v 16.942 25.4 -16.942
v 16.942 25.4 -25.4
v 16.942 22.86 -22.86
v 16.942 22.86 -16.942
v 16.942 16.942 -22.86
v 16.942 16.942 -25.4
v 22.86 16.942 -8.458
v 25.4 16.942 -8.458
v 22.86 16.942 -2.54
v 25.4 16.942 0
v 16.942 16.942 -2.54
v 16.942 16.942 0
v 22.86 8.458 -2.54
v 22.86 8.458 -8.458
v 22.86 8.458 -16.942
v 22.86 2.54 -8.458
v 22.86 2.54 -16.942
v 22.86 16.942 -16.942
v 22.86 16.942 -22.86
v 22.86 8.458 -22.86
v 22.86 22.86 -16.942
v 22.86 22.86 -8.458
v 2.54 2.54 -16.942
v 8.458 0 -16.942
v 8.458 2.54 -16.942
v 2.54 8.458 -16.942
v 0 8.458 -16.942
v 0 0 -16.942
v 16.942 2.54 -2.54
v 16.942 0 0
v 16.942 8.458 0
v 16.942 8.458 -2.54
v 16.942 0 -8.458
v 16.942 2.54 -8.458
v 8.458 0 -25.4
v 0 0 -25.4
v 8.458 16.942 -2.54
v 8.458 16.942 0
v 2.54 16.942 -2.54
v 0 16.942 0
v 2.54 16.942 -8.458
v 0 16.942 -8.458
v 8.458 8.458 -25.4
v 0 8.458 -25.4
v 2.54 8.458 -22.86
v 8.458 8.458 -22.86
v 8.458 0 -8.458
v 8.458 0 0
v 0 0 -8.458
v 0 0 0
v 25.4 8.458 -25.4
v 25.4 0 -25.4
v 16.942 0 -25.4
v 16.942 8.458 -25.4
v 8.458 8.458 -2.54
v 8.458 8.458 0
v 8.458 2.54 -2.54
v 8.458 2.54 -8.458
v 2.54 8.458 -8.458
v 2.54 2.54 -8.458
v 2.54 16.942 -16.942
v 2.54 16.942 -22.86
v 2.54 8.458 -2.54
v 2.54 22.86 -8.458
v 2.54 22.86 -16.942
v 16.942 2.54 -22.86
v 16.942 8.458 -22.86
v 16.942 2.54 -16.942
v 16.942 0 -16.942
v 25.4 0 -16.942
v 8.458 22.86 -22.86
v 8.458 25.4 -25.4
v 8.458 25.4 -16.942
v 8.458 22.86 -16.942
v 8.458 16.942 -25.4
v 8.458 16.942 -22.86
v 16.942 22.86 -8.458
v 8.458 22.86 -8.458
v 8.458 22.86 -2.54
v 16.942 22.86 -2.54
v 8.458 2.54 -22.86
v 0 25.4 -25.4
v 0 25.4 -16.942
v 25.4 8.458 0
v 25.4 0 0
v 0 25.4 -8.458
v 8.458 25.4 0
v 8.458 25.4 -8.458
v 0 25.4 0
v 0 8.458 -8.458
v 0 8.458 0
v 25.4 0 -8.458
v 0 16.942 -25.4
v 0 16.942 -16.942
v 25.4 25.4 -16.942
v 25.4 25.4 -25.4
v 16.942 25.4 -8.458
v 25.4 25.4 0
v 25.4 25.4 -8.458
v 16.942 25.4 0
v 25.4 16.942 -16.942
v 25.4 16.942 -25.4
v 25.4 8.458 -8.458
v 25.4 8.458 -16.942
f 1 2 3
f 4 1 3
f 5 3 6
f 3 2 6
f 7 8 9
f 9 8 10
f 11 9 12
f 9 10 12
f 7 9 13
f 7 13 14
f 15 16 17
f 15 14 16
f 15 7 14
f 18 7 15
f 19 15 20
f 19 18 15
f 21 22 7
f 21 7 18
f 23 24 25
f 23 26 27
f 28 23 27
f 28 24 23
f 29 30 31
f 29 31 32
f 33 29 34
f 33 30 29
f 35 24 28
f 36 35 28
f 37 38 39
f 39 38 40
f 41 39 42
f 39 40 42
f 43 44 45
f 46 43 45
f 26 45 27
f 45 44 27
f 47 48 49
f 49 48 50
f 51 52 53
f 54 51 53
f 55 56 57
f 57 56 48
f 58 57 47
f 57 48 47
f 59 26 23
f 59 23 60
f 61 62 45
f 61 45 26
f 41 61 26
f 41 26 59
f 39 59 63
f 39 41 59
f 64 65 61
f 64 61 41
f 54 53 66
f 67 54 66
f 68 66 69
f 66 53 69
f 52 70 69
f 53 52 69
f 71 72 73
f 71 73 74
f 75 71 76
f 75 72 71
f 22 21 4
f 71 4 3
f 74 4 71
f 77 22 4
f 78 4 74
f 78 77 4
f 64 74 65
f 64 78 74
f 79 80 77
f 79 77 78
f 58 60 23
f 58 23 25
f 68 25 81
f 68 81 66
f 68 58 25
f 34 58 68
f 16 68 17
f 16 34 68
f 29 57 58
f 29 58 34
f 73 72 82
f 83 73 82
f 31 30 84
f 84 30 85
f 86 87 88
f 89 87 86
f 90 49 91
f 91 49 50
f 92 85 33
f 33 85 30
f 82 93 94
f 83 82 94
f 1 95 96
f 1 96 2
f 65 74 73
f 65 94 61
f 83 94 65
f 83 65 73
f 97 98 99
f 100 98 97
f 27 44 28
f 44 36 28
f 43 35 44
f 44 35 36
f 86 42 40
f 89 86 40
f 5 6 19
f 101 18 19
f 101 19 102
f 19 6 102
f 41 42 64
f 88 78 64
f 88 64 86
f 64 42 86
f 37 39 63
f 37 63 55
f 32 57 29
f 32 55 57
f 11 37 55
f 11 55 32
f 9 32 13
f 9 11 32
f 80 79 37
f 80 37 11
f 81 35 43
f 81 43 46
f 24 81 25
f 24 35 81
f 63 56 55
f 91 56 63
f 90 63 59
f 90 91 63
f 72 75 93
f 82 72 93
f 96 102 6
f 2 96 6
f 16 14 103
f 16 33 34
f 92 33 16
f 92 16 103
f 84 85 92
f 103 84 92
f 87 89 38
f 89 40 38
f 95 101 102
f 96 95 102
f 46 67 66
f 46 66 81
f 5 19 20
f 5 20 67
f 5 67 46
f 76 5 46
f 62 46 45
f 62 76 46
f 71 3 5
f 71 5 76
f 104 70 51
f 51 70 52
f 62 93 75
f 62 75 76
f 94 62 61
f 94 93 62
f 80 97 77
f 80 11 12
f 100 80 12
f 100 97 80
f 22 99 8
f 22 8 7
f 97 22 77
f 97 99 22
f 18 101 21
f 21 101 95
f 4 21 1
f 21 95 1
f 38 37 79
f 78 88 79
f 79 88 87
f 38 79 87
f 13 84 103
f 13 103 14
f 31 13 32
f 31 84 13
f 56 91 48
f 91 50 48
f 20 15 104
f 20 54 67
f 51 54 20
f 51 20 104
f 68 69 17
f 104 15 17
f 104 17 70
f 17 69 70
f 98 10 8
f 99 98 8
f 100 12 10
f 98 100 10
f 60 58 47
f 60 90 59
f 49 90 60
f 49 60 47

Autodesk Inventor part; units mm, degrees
sketch "Sketch1" plane through (0, 0, 0) normal (0, 1, 0) x (-1, 0, 0)
  line L0 (0, 0) -> (-25.4, 0)
  line L1 (-25.4, 0) -> (-25.4, -25.4)
  line L2 (-25.4, -25.4) -> (0, -25.4)
  line L3 (0, -25.4) -> (0, 0)
  dimension "d0" = 25.4
  dimension "d1" = 25.4
extrude "Extrusion1" add sketch "Sketch1" along normal blind 25.4
sketch "Sketch3" plane through (25.4, 0, 0) normal (1, 0, 0) x (0, 0, -1)
  line L0 (0, 25.4) -> (8.4582, 25.4)
  line L1 (8.4582, 25.4) -> (8.4582, 16.9418)
  line L2 (8.4582, 16.9418) -> (0, 16.9418)
  line L3 (0, 16.9418) -> (0, 25.4)
  line L4 (0, 0) -> (8.4582, 0)
  line L5 (8.4582, 0) -> (8.4582, 8.4582)
  line L6 (8.4582, 8.4582) -> (0, 8.4582)
  line L7 (0, 8.4582) -> (0, 0)
  line L8 (0, 0) -> (25.4, 0) projected
  line L9 (25.4, 0) -> (16.9418, 0)
  line L10 (16.9418, 0) -> (16.9418, 8.4582)
  line L11 (16.9418, 8.4582) -> (25.4, 8.4582)
  line L12 (25.4, 8.4582) -> (25.4, 0)
  line L13 (0, 25.4) -> (25.4, 25.4) projected
  line L14 (25.4, 25.4) -> (16.9418, 25.4)
  line L15 (16.9418, 25.4) -> (16.9418, 16.9418)
  line L16 (16.9418, 16.9418) -> (25.4, 16.9418)
  line L17 (25.4, 16.9418) -> (25.4, 25.4)
  line L18 (8.4582, 25.4) -> (16.9418, 25.4)
  line L19 (16.9418, 25.4) -> (16.9418, 0)
  line L20 (16.9418, 0) -> (8.4582, 0)
  line L21 (8.4582, 0) -> (8.4582, 25.4)
  line L22 (0, 16.9418) -> (25.4, 16.9418)
  line L23 (25.4, 16.9418) -> (25.4, 8.4582)
  line L24 (25.4, 8.4582) -> (0, 8.4582)
  line L25 (0, 8.4582) -> (0, 16.9418)
  dimension "d4" = 8.4582
  dimension "d5" = 8.4582
  dimension "d6" = 8.4582
  dimension "d7" = 8.4582
  dimension "d8" = 8.4582
  dimension "d9" = 8.4582
  dimension "d10" = 8.4582
  dimension "d11" = 8.4582
extrude "Extrusion2" cut sketch "Sketch3" against normal blind 2.54 contours L13 L15 L22 L1 | L2 L21 L6 L25 | L22 L19 L24 L21 | L24 L10 L8 L5 | L16 L23 L11 L19
sketch "Sketch5" plane through (25.4, 0, -25.4) normal (0, 0, -1) x (-1, 0, 0)
  line L0 (25.4, 0) -> (25.4, 25.4) projected
  line L1 (25.4, 0) -> (16.9418, 0)
  line L2 (16.9418, 0) -> (16.9418, 8.4582)
  line L3 (16.9418, 8.4582) -> (25.4, 8.4582)
  line L4 (25.4, 8.4582) -> (25.4, 0)
  line L5 (0, 0) -> (8.4582, 0)
  line L6 (8.4582, 0) -> (8.4582, 8.4582)
  line L7 (8.4582, 8.4582) -> (0, 8.4582)
  line L8 (0, 8.4582) -> (0, 0)
  line L9 (2.54, 25.4) -> (0, 25.4) projected
  line L10 (0, 25.4) -> (8.4582, 25.4)
  line L11 (8.4582, 25.4) -> (8.4582, 16.9418)
  line L12 (8.4582, 16.9418) -> (0, 16.9418)
  line L13 (0, 16.9418) -> (0, 25.4)
  line L14 (0, 25.4) -> (25.4, 25.4) projected
  line L15 (25.4, 25.4) -> (16.9418, 25.4)
  line L16 (16.9418, 25.4) -> (16.9418, 16.9418)
  line L17 (16.9418, 16.9418) -> (25.4, 16.9418)
  line L18 (25.4, 16.9418) -> (25.4, 25.4)
  line L19 (0, 8.4582) -> (2.54, 8.4582) projected
  line L20 (0, 8.4582) -> (25.4, 8.4582)
  line L21 (25.4, 8.4582) -> (25.4, 16.9418)
  line L22 (25.4, 16.9418) -> (0, 16.9418)
  line L23 (0, 16.9418) -> (0, 8.4582)
  line L24 (8.4582, 25.4) -> (16.9418, 25.4)
  line L25 (16.9418, 25.4) -> (16.9418, 0)
  line L26 (16.9418, 0) -> (8.4582, 0)
  line L27 (8.4582, 0) -> (8.4582, 25.4)
  dimension "d14" = 8.4582
  dimension "d15" = 8.4582
  dimension "d16" = 8.4582
  dimension "d17" = 8.4582
  dimension "d18" = 8.4582
  dimension "d19" = 8.4582
  dimension "d20" = 8.4582
  dimension "d21" = 8.4582
extrude "Extrusion3" cut sketch "Sketch5" against normal blind 2.54 contours L3 L25 L17 L0 | L26 L6 L20 L2 | L20 L27 L22 L25 | L22 L11 L14 L16 | L7 L23 L12 L27
sketch "Sketch7" plane through (0, 0, 0) normal (0, -1, 0) x (1, 0, 0)
  line L0 (25.4, -16.9418) -> (25.4, -25.4) projected
  line L1 (25.4, -25.4) -> (16.9418, -25.4)
  line L2 (16.9418, -25.4) -> (16.9418, -16.9418)
  line L3 (16.9418, -16.9418) -> (25.4, -16.9418)
  line L4 (25.4, -16.9418) -> (25.4, -25.4)
  line L5 (8.4582, -25.4) -> (0, -25.4) projected
  line L6 (0, -25.4) -> (8.4582, -25.4)
  line L7 (8.4582, -25.4) -> (8.4582, -16.9418)
  line L8 (8.4582, -16.9418) -> (0, -16.9418)
  line L9 (0, -16.9418) -> (0, -25.4)
  line L10 (25.4, -8.4582) -> (25.4, 0) projected
  line L11 (25.4, 0) -> (16.9418, 0)
  line L12 (16.9418, 0) -> (16.9418, -8.4582)
  line L13 (16.9418, -8.4582) -> (25.4, -8.4582)
  line L14 (25.4, -8.4582) -> (25.4, 0)
  line L15 (0, 0) -> (25.4, 0) projected
  line L16 (0, 0) -> (8.4582, 0)
  line L17 (8.4582, 0) -> (8.4582, -8.4582)
  line L18 (8.4582, -8.4582) -> (0, -8.4582)
  line L19 (0, -8.4582) -> (0, 0)
  line L20 (16.9418, -25.4) -> (8.4582, -25.4)
  line L21 (8.4582, -25.4) -> (8.4582, 0)
  line L22 (8.4582, 0) -> (16.9418, 0)
  line L23 (16.9418, 0) -> (16.9418, -25.4)
  line L24 (0, -16.9418) -> (25.4, -16.9418)
  line L25 (25.4, -16.9418) -> (25.4, -8.4582)
  line L26 (25.4, -8.4582) -> (0, -8.4582)
  line L27 (0, -8.4582) -> (0, -16.9418)
  dimension "d32" = 8.4582
  dimension "d33" = 8.4582
  dimension "d34" = 8.4582
  dimension "d35" = 8.4582
  dimension "d36" = 8.4582
  dimension "d37" = 8.4582
  dimension "d38" = 8.4582
  dimension "d39" = 8.4582
extrude "Extrusion4" cut sketch "Sketch7" against normal blind 2.54 contours L3 L23 L13 L25 | L24 L21 L26 L23 | L2 L20 L7 L24 | L26 L17 L15 L12 | L8 L27 L18 L21
ref_plane "Work Plane1" through (12.7, 0, 0) normal (1, 0, 0) x (0, 1, 0)
ref_plane "Work Plane2" through (0, 12.7, 0) normal (0, 1, 0) x (-1, 0, 0)
ref_plane "Work Plane3" through (0, 0, -12.7) normal (0, 0, 1) x (1, 0, 0)
mirror "Mirror1" about plane through (12.7, 0, 0) normal (1, 0, 0) of "Extrusion2"
mirror "Mirror2" about plane through (0, 0, -12.7) normal (0, 0, 1) of "Extrusion3"
mirror "Mirror3" about plane through (0, 12.7, 0) normal (0, 1, 0) of "Extrusion4"
ref_plane "Work Plane4" through (0, 12.7, 0) normal (0, 1, 0) x (-1, 0, 0)
properties part number "Portal"
